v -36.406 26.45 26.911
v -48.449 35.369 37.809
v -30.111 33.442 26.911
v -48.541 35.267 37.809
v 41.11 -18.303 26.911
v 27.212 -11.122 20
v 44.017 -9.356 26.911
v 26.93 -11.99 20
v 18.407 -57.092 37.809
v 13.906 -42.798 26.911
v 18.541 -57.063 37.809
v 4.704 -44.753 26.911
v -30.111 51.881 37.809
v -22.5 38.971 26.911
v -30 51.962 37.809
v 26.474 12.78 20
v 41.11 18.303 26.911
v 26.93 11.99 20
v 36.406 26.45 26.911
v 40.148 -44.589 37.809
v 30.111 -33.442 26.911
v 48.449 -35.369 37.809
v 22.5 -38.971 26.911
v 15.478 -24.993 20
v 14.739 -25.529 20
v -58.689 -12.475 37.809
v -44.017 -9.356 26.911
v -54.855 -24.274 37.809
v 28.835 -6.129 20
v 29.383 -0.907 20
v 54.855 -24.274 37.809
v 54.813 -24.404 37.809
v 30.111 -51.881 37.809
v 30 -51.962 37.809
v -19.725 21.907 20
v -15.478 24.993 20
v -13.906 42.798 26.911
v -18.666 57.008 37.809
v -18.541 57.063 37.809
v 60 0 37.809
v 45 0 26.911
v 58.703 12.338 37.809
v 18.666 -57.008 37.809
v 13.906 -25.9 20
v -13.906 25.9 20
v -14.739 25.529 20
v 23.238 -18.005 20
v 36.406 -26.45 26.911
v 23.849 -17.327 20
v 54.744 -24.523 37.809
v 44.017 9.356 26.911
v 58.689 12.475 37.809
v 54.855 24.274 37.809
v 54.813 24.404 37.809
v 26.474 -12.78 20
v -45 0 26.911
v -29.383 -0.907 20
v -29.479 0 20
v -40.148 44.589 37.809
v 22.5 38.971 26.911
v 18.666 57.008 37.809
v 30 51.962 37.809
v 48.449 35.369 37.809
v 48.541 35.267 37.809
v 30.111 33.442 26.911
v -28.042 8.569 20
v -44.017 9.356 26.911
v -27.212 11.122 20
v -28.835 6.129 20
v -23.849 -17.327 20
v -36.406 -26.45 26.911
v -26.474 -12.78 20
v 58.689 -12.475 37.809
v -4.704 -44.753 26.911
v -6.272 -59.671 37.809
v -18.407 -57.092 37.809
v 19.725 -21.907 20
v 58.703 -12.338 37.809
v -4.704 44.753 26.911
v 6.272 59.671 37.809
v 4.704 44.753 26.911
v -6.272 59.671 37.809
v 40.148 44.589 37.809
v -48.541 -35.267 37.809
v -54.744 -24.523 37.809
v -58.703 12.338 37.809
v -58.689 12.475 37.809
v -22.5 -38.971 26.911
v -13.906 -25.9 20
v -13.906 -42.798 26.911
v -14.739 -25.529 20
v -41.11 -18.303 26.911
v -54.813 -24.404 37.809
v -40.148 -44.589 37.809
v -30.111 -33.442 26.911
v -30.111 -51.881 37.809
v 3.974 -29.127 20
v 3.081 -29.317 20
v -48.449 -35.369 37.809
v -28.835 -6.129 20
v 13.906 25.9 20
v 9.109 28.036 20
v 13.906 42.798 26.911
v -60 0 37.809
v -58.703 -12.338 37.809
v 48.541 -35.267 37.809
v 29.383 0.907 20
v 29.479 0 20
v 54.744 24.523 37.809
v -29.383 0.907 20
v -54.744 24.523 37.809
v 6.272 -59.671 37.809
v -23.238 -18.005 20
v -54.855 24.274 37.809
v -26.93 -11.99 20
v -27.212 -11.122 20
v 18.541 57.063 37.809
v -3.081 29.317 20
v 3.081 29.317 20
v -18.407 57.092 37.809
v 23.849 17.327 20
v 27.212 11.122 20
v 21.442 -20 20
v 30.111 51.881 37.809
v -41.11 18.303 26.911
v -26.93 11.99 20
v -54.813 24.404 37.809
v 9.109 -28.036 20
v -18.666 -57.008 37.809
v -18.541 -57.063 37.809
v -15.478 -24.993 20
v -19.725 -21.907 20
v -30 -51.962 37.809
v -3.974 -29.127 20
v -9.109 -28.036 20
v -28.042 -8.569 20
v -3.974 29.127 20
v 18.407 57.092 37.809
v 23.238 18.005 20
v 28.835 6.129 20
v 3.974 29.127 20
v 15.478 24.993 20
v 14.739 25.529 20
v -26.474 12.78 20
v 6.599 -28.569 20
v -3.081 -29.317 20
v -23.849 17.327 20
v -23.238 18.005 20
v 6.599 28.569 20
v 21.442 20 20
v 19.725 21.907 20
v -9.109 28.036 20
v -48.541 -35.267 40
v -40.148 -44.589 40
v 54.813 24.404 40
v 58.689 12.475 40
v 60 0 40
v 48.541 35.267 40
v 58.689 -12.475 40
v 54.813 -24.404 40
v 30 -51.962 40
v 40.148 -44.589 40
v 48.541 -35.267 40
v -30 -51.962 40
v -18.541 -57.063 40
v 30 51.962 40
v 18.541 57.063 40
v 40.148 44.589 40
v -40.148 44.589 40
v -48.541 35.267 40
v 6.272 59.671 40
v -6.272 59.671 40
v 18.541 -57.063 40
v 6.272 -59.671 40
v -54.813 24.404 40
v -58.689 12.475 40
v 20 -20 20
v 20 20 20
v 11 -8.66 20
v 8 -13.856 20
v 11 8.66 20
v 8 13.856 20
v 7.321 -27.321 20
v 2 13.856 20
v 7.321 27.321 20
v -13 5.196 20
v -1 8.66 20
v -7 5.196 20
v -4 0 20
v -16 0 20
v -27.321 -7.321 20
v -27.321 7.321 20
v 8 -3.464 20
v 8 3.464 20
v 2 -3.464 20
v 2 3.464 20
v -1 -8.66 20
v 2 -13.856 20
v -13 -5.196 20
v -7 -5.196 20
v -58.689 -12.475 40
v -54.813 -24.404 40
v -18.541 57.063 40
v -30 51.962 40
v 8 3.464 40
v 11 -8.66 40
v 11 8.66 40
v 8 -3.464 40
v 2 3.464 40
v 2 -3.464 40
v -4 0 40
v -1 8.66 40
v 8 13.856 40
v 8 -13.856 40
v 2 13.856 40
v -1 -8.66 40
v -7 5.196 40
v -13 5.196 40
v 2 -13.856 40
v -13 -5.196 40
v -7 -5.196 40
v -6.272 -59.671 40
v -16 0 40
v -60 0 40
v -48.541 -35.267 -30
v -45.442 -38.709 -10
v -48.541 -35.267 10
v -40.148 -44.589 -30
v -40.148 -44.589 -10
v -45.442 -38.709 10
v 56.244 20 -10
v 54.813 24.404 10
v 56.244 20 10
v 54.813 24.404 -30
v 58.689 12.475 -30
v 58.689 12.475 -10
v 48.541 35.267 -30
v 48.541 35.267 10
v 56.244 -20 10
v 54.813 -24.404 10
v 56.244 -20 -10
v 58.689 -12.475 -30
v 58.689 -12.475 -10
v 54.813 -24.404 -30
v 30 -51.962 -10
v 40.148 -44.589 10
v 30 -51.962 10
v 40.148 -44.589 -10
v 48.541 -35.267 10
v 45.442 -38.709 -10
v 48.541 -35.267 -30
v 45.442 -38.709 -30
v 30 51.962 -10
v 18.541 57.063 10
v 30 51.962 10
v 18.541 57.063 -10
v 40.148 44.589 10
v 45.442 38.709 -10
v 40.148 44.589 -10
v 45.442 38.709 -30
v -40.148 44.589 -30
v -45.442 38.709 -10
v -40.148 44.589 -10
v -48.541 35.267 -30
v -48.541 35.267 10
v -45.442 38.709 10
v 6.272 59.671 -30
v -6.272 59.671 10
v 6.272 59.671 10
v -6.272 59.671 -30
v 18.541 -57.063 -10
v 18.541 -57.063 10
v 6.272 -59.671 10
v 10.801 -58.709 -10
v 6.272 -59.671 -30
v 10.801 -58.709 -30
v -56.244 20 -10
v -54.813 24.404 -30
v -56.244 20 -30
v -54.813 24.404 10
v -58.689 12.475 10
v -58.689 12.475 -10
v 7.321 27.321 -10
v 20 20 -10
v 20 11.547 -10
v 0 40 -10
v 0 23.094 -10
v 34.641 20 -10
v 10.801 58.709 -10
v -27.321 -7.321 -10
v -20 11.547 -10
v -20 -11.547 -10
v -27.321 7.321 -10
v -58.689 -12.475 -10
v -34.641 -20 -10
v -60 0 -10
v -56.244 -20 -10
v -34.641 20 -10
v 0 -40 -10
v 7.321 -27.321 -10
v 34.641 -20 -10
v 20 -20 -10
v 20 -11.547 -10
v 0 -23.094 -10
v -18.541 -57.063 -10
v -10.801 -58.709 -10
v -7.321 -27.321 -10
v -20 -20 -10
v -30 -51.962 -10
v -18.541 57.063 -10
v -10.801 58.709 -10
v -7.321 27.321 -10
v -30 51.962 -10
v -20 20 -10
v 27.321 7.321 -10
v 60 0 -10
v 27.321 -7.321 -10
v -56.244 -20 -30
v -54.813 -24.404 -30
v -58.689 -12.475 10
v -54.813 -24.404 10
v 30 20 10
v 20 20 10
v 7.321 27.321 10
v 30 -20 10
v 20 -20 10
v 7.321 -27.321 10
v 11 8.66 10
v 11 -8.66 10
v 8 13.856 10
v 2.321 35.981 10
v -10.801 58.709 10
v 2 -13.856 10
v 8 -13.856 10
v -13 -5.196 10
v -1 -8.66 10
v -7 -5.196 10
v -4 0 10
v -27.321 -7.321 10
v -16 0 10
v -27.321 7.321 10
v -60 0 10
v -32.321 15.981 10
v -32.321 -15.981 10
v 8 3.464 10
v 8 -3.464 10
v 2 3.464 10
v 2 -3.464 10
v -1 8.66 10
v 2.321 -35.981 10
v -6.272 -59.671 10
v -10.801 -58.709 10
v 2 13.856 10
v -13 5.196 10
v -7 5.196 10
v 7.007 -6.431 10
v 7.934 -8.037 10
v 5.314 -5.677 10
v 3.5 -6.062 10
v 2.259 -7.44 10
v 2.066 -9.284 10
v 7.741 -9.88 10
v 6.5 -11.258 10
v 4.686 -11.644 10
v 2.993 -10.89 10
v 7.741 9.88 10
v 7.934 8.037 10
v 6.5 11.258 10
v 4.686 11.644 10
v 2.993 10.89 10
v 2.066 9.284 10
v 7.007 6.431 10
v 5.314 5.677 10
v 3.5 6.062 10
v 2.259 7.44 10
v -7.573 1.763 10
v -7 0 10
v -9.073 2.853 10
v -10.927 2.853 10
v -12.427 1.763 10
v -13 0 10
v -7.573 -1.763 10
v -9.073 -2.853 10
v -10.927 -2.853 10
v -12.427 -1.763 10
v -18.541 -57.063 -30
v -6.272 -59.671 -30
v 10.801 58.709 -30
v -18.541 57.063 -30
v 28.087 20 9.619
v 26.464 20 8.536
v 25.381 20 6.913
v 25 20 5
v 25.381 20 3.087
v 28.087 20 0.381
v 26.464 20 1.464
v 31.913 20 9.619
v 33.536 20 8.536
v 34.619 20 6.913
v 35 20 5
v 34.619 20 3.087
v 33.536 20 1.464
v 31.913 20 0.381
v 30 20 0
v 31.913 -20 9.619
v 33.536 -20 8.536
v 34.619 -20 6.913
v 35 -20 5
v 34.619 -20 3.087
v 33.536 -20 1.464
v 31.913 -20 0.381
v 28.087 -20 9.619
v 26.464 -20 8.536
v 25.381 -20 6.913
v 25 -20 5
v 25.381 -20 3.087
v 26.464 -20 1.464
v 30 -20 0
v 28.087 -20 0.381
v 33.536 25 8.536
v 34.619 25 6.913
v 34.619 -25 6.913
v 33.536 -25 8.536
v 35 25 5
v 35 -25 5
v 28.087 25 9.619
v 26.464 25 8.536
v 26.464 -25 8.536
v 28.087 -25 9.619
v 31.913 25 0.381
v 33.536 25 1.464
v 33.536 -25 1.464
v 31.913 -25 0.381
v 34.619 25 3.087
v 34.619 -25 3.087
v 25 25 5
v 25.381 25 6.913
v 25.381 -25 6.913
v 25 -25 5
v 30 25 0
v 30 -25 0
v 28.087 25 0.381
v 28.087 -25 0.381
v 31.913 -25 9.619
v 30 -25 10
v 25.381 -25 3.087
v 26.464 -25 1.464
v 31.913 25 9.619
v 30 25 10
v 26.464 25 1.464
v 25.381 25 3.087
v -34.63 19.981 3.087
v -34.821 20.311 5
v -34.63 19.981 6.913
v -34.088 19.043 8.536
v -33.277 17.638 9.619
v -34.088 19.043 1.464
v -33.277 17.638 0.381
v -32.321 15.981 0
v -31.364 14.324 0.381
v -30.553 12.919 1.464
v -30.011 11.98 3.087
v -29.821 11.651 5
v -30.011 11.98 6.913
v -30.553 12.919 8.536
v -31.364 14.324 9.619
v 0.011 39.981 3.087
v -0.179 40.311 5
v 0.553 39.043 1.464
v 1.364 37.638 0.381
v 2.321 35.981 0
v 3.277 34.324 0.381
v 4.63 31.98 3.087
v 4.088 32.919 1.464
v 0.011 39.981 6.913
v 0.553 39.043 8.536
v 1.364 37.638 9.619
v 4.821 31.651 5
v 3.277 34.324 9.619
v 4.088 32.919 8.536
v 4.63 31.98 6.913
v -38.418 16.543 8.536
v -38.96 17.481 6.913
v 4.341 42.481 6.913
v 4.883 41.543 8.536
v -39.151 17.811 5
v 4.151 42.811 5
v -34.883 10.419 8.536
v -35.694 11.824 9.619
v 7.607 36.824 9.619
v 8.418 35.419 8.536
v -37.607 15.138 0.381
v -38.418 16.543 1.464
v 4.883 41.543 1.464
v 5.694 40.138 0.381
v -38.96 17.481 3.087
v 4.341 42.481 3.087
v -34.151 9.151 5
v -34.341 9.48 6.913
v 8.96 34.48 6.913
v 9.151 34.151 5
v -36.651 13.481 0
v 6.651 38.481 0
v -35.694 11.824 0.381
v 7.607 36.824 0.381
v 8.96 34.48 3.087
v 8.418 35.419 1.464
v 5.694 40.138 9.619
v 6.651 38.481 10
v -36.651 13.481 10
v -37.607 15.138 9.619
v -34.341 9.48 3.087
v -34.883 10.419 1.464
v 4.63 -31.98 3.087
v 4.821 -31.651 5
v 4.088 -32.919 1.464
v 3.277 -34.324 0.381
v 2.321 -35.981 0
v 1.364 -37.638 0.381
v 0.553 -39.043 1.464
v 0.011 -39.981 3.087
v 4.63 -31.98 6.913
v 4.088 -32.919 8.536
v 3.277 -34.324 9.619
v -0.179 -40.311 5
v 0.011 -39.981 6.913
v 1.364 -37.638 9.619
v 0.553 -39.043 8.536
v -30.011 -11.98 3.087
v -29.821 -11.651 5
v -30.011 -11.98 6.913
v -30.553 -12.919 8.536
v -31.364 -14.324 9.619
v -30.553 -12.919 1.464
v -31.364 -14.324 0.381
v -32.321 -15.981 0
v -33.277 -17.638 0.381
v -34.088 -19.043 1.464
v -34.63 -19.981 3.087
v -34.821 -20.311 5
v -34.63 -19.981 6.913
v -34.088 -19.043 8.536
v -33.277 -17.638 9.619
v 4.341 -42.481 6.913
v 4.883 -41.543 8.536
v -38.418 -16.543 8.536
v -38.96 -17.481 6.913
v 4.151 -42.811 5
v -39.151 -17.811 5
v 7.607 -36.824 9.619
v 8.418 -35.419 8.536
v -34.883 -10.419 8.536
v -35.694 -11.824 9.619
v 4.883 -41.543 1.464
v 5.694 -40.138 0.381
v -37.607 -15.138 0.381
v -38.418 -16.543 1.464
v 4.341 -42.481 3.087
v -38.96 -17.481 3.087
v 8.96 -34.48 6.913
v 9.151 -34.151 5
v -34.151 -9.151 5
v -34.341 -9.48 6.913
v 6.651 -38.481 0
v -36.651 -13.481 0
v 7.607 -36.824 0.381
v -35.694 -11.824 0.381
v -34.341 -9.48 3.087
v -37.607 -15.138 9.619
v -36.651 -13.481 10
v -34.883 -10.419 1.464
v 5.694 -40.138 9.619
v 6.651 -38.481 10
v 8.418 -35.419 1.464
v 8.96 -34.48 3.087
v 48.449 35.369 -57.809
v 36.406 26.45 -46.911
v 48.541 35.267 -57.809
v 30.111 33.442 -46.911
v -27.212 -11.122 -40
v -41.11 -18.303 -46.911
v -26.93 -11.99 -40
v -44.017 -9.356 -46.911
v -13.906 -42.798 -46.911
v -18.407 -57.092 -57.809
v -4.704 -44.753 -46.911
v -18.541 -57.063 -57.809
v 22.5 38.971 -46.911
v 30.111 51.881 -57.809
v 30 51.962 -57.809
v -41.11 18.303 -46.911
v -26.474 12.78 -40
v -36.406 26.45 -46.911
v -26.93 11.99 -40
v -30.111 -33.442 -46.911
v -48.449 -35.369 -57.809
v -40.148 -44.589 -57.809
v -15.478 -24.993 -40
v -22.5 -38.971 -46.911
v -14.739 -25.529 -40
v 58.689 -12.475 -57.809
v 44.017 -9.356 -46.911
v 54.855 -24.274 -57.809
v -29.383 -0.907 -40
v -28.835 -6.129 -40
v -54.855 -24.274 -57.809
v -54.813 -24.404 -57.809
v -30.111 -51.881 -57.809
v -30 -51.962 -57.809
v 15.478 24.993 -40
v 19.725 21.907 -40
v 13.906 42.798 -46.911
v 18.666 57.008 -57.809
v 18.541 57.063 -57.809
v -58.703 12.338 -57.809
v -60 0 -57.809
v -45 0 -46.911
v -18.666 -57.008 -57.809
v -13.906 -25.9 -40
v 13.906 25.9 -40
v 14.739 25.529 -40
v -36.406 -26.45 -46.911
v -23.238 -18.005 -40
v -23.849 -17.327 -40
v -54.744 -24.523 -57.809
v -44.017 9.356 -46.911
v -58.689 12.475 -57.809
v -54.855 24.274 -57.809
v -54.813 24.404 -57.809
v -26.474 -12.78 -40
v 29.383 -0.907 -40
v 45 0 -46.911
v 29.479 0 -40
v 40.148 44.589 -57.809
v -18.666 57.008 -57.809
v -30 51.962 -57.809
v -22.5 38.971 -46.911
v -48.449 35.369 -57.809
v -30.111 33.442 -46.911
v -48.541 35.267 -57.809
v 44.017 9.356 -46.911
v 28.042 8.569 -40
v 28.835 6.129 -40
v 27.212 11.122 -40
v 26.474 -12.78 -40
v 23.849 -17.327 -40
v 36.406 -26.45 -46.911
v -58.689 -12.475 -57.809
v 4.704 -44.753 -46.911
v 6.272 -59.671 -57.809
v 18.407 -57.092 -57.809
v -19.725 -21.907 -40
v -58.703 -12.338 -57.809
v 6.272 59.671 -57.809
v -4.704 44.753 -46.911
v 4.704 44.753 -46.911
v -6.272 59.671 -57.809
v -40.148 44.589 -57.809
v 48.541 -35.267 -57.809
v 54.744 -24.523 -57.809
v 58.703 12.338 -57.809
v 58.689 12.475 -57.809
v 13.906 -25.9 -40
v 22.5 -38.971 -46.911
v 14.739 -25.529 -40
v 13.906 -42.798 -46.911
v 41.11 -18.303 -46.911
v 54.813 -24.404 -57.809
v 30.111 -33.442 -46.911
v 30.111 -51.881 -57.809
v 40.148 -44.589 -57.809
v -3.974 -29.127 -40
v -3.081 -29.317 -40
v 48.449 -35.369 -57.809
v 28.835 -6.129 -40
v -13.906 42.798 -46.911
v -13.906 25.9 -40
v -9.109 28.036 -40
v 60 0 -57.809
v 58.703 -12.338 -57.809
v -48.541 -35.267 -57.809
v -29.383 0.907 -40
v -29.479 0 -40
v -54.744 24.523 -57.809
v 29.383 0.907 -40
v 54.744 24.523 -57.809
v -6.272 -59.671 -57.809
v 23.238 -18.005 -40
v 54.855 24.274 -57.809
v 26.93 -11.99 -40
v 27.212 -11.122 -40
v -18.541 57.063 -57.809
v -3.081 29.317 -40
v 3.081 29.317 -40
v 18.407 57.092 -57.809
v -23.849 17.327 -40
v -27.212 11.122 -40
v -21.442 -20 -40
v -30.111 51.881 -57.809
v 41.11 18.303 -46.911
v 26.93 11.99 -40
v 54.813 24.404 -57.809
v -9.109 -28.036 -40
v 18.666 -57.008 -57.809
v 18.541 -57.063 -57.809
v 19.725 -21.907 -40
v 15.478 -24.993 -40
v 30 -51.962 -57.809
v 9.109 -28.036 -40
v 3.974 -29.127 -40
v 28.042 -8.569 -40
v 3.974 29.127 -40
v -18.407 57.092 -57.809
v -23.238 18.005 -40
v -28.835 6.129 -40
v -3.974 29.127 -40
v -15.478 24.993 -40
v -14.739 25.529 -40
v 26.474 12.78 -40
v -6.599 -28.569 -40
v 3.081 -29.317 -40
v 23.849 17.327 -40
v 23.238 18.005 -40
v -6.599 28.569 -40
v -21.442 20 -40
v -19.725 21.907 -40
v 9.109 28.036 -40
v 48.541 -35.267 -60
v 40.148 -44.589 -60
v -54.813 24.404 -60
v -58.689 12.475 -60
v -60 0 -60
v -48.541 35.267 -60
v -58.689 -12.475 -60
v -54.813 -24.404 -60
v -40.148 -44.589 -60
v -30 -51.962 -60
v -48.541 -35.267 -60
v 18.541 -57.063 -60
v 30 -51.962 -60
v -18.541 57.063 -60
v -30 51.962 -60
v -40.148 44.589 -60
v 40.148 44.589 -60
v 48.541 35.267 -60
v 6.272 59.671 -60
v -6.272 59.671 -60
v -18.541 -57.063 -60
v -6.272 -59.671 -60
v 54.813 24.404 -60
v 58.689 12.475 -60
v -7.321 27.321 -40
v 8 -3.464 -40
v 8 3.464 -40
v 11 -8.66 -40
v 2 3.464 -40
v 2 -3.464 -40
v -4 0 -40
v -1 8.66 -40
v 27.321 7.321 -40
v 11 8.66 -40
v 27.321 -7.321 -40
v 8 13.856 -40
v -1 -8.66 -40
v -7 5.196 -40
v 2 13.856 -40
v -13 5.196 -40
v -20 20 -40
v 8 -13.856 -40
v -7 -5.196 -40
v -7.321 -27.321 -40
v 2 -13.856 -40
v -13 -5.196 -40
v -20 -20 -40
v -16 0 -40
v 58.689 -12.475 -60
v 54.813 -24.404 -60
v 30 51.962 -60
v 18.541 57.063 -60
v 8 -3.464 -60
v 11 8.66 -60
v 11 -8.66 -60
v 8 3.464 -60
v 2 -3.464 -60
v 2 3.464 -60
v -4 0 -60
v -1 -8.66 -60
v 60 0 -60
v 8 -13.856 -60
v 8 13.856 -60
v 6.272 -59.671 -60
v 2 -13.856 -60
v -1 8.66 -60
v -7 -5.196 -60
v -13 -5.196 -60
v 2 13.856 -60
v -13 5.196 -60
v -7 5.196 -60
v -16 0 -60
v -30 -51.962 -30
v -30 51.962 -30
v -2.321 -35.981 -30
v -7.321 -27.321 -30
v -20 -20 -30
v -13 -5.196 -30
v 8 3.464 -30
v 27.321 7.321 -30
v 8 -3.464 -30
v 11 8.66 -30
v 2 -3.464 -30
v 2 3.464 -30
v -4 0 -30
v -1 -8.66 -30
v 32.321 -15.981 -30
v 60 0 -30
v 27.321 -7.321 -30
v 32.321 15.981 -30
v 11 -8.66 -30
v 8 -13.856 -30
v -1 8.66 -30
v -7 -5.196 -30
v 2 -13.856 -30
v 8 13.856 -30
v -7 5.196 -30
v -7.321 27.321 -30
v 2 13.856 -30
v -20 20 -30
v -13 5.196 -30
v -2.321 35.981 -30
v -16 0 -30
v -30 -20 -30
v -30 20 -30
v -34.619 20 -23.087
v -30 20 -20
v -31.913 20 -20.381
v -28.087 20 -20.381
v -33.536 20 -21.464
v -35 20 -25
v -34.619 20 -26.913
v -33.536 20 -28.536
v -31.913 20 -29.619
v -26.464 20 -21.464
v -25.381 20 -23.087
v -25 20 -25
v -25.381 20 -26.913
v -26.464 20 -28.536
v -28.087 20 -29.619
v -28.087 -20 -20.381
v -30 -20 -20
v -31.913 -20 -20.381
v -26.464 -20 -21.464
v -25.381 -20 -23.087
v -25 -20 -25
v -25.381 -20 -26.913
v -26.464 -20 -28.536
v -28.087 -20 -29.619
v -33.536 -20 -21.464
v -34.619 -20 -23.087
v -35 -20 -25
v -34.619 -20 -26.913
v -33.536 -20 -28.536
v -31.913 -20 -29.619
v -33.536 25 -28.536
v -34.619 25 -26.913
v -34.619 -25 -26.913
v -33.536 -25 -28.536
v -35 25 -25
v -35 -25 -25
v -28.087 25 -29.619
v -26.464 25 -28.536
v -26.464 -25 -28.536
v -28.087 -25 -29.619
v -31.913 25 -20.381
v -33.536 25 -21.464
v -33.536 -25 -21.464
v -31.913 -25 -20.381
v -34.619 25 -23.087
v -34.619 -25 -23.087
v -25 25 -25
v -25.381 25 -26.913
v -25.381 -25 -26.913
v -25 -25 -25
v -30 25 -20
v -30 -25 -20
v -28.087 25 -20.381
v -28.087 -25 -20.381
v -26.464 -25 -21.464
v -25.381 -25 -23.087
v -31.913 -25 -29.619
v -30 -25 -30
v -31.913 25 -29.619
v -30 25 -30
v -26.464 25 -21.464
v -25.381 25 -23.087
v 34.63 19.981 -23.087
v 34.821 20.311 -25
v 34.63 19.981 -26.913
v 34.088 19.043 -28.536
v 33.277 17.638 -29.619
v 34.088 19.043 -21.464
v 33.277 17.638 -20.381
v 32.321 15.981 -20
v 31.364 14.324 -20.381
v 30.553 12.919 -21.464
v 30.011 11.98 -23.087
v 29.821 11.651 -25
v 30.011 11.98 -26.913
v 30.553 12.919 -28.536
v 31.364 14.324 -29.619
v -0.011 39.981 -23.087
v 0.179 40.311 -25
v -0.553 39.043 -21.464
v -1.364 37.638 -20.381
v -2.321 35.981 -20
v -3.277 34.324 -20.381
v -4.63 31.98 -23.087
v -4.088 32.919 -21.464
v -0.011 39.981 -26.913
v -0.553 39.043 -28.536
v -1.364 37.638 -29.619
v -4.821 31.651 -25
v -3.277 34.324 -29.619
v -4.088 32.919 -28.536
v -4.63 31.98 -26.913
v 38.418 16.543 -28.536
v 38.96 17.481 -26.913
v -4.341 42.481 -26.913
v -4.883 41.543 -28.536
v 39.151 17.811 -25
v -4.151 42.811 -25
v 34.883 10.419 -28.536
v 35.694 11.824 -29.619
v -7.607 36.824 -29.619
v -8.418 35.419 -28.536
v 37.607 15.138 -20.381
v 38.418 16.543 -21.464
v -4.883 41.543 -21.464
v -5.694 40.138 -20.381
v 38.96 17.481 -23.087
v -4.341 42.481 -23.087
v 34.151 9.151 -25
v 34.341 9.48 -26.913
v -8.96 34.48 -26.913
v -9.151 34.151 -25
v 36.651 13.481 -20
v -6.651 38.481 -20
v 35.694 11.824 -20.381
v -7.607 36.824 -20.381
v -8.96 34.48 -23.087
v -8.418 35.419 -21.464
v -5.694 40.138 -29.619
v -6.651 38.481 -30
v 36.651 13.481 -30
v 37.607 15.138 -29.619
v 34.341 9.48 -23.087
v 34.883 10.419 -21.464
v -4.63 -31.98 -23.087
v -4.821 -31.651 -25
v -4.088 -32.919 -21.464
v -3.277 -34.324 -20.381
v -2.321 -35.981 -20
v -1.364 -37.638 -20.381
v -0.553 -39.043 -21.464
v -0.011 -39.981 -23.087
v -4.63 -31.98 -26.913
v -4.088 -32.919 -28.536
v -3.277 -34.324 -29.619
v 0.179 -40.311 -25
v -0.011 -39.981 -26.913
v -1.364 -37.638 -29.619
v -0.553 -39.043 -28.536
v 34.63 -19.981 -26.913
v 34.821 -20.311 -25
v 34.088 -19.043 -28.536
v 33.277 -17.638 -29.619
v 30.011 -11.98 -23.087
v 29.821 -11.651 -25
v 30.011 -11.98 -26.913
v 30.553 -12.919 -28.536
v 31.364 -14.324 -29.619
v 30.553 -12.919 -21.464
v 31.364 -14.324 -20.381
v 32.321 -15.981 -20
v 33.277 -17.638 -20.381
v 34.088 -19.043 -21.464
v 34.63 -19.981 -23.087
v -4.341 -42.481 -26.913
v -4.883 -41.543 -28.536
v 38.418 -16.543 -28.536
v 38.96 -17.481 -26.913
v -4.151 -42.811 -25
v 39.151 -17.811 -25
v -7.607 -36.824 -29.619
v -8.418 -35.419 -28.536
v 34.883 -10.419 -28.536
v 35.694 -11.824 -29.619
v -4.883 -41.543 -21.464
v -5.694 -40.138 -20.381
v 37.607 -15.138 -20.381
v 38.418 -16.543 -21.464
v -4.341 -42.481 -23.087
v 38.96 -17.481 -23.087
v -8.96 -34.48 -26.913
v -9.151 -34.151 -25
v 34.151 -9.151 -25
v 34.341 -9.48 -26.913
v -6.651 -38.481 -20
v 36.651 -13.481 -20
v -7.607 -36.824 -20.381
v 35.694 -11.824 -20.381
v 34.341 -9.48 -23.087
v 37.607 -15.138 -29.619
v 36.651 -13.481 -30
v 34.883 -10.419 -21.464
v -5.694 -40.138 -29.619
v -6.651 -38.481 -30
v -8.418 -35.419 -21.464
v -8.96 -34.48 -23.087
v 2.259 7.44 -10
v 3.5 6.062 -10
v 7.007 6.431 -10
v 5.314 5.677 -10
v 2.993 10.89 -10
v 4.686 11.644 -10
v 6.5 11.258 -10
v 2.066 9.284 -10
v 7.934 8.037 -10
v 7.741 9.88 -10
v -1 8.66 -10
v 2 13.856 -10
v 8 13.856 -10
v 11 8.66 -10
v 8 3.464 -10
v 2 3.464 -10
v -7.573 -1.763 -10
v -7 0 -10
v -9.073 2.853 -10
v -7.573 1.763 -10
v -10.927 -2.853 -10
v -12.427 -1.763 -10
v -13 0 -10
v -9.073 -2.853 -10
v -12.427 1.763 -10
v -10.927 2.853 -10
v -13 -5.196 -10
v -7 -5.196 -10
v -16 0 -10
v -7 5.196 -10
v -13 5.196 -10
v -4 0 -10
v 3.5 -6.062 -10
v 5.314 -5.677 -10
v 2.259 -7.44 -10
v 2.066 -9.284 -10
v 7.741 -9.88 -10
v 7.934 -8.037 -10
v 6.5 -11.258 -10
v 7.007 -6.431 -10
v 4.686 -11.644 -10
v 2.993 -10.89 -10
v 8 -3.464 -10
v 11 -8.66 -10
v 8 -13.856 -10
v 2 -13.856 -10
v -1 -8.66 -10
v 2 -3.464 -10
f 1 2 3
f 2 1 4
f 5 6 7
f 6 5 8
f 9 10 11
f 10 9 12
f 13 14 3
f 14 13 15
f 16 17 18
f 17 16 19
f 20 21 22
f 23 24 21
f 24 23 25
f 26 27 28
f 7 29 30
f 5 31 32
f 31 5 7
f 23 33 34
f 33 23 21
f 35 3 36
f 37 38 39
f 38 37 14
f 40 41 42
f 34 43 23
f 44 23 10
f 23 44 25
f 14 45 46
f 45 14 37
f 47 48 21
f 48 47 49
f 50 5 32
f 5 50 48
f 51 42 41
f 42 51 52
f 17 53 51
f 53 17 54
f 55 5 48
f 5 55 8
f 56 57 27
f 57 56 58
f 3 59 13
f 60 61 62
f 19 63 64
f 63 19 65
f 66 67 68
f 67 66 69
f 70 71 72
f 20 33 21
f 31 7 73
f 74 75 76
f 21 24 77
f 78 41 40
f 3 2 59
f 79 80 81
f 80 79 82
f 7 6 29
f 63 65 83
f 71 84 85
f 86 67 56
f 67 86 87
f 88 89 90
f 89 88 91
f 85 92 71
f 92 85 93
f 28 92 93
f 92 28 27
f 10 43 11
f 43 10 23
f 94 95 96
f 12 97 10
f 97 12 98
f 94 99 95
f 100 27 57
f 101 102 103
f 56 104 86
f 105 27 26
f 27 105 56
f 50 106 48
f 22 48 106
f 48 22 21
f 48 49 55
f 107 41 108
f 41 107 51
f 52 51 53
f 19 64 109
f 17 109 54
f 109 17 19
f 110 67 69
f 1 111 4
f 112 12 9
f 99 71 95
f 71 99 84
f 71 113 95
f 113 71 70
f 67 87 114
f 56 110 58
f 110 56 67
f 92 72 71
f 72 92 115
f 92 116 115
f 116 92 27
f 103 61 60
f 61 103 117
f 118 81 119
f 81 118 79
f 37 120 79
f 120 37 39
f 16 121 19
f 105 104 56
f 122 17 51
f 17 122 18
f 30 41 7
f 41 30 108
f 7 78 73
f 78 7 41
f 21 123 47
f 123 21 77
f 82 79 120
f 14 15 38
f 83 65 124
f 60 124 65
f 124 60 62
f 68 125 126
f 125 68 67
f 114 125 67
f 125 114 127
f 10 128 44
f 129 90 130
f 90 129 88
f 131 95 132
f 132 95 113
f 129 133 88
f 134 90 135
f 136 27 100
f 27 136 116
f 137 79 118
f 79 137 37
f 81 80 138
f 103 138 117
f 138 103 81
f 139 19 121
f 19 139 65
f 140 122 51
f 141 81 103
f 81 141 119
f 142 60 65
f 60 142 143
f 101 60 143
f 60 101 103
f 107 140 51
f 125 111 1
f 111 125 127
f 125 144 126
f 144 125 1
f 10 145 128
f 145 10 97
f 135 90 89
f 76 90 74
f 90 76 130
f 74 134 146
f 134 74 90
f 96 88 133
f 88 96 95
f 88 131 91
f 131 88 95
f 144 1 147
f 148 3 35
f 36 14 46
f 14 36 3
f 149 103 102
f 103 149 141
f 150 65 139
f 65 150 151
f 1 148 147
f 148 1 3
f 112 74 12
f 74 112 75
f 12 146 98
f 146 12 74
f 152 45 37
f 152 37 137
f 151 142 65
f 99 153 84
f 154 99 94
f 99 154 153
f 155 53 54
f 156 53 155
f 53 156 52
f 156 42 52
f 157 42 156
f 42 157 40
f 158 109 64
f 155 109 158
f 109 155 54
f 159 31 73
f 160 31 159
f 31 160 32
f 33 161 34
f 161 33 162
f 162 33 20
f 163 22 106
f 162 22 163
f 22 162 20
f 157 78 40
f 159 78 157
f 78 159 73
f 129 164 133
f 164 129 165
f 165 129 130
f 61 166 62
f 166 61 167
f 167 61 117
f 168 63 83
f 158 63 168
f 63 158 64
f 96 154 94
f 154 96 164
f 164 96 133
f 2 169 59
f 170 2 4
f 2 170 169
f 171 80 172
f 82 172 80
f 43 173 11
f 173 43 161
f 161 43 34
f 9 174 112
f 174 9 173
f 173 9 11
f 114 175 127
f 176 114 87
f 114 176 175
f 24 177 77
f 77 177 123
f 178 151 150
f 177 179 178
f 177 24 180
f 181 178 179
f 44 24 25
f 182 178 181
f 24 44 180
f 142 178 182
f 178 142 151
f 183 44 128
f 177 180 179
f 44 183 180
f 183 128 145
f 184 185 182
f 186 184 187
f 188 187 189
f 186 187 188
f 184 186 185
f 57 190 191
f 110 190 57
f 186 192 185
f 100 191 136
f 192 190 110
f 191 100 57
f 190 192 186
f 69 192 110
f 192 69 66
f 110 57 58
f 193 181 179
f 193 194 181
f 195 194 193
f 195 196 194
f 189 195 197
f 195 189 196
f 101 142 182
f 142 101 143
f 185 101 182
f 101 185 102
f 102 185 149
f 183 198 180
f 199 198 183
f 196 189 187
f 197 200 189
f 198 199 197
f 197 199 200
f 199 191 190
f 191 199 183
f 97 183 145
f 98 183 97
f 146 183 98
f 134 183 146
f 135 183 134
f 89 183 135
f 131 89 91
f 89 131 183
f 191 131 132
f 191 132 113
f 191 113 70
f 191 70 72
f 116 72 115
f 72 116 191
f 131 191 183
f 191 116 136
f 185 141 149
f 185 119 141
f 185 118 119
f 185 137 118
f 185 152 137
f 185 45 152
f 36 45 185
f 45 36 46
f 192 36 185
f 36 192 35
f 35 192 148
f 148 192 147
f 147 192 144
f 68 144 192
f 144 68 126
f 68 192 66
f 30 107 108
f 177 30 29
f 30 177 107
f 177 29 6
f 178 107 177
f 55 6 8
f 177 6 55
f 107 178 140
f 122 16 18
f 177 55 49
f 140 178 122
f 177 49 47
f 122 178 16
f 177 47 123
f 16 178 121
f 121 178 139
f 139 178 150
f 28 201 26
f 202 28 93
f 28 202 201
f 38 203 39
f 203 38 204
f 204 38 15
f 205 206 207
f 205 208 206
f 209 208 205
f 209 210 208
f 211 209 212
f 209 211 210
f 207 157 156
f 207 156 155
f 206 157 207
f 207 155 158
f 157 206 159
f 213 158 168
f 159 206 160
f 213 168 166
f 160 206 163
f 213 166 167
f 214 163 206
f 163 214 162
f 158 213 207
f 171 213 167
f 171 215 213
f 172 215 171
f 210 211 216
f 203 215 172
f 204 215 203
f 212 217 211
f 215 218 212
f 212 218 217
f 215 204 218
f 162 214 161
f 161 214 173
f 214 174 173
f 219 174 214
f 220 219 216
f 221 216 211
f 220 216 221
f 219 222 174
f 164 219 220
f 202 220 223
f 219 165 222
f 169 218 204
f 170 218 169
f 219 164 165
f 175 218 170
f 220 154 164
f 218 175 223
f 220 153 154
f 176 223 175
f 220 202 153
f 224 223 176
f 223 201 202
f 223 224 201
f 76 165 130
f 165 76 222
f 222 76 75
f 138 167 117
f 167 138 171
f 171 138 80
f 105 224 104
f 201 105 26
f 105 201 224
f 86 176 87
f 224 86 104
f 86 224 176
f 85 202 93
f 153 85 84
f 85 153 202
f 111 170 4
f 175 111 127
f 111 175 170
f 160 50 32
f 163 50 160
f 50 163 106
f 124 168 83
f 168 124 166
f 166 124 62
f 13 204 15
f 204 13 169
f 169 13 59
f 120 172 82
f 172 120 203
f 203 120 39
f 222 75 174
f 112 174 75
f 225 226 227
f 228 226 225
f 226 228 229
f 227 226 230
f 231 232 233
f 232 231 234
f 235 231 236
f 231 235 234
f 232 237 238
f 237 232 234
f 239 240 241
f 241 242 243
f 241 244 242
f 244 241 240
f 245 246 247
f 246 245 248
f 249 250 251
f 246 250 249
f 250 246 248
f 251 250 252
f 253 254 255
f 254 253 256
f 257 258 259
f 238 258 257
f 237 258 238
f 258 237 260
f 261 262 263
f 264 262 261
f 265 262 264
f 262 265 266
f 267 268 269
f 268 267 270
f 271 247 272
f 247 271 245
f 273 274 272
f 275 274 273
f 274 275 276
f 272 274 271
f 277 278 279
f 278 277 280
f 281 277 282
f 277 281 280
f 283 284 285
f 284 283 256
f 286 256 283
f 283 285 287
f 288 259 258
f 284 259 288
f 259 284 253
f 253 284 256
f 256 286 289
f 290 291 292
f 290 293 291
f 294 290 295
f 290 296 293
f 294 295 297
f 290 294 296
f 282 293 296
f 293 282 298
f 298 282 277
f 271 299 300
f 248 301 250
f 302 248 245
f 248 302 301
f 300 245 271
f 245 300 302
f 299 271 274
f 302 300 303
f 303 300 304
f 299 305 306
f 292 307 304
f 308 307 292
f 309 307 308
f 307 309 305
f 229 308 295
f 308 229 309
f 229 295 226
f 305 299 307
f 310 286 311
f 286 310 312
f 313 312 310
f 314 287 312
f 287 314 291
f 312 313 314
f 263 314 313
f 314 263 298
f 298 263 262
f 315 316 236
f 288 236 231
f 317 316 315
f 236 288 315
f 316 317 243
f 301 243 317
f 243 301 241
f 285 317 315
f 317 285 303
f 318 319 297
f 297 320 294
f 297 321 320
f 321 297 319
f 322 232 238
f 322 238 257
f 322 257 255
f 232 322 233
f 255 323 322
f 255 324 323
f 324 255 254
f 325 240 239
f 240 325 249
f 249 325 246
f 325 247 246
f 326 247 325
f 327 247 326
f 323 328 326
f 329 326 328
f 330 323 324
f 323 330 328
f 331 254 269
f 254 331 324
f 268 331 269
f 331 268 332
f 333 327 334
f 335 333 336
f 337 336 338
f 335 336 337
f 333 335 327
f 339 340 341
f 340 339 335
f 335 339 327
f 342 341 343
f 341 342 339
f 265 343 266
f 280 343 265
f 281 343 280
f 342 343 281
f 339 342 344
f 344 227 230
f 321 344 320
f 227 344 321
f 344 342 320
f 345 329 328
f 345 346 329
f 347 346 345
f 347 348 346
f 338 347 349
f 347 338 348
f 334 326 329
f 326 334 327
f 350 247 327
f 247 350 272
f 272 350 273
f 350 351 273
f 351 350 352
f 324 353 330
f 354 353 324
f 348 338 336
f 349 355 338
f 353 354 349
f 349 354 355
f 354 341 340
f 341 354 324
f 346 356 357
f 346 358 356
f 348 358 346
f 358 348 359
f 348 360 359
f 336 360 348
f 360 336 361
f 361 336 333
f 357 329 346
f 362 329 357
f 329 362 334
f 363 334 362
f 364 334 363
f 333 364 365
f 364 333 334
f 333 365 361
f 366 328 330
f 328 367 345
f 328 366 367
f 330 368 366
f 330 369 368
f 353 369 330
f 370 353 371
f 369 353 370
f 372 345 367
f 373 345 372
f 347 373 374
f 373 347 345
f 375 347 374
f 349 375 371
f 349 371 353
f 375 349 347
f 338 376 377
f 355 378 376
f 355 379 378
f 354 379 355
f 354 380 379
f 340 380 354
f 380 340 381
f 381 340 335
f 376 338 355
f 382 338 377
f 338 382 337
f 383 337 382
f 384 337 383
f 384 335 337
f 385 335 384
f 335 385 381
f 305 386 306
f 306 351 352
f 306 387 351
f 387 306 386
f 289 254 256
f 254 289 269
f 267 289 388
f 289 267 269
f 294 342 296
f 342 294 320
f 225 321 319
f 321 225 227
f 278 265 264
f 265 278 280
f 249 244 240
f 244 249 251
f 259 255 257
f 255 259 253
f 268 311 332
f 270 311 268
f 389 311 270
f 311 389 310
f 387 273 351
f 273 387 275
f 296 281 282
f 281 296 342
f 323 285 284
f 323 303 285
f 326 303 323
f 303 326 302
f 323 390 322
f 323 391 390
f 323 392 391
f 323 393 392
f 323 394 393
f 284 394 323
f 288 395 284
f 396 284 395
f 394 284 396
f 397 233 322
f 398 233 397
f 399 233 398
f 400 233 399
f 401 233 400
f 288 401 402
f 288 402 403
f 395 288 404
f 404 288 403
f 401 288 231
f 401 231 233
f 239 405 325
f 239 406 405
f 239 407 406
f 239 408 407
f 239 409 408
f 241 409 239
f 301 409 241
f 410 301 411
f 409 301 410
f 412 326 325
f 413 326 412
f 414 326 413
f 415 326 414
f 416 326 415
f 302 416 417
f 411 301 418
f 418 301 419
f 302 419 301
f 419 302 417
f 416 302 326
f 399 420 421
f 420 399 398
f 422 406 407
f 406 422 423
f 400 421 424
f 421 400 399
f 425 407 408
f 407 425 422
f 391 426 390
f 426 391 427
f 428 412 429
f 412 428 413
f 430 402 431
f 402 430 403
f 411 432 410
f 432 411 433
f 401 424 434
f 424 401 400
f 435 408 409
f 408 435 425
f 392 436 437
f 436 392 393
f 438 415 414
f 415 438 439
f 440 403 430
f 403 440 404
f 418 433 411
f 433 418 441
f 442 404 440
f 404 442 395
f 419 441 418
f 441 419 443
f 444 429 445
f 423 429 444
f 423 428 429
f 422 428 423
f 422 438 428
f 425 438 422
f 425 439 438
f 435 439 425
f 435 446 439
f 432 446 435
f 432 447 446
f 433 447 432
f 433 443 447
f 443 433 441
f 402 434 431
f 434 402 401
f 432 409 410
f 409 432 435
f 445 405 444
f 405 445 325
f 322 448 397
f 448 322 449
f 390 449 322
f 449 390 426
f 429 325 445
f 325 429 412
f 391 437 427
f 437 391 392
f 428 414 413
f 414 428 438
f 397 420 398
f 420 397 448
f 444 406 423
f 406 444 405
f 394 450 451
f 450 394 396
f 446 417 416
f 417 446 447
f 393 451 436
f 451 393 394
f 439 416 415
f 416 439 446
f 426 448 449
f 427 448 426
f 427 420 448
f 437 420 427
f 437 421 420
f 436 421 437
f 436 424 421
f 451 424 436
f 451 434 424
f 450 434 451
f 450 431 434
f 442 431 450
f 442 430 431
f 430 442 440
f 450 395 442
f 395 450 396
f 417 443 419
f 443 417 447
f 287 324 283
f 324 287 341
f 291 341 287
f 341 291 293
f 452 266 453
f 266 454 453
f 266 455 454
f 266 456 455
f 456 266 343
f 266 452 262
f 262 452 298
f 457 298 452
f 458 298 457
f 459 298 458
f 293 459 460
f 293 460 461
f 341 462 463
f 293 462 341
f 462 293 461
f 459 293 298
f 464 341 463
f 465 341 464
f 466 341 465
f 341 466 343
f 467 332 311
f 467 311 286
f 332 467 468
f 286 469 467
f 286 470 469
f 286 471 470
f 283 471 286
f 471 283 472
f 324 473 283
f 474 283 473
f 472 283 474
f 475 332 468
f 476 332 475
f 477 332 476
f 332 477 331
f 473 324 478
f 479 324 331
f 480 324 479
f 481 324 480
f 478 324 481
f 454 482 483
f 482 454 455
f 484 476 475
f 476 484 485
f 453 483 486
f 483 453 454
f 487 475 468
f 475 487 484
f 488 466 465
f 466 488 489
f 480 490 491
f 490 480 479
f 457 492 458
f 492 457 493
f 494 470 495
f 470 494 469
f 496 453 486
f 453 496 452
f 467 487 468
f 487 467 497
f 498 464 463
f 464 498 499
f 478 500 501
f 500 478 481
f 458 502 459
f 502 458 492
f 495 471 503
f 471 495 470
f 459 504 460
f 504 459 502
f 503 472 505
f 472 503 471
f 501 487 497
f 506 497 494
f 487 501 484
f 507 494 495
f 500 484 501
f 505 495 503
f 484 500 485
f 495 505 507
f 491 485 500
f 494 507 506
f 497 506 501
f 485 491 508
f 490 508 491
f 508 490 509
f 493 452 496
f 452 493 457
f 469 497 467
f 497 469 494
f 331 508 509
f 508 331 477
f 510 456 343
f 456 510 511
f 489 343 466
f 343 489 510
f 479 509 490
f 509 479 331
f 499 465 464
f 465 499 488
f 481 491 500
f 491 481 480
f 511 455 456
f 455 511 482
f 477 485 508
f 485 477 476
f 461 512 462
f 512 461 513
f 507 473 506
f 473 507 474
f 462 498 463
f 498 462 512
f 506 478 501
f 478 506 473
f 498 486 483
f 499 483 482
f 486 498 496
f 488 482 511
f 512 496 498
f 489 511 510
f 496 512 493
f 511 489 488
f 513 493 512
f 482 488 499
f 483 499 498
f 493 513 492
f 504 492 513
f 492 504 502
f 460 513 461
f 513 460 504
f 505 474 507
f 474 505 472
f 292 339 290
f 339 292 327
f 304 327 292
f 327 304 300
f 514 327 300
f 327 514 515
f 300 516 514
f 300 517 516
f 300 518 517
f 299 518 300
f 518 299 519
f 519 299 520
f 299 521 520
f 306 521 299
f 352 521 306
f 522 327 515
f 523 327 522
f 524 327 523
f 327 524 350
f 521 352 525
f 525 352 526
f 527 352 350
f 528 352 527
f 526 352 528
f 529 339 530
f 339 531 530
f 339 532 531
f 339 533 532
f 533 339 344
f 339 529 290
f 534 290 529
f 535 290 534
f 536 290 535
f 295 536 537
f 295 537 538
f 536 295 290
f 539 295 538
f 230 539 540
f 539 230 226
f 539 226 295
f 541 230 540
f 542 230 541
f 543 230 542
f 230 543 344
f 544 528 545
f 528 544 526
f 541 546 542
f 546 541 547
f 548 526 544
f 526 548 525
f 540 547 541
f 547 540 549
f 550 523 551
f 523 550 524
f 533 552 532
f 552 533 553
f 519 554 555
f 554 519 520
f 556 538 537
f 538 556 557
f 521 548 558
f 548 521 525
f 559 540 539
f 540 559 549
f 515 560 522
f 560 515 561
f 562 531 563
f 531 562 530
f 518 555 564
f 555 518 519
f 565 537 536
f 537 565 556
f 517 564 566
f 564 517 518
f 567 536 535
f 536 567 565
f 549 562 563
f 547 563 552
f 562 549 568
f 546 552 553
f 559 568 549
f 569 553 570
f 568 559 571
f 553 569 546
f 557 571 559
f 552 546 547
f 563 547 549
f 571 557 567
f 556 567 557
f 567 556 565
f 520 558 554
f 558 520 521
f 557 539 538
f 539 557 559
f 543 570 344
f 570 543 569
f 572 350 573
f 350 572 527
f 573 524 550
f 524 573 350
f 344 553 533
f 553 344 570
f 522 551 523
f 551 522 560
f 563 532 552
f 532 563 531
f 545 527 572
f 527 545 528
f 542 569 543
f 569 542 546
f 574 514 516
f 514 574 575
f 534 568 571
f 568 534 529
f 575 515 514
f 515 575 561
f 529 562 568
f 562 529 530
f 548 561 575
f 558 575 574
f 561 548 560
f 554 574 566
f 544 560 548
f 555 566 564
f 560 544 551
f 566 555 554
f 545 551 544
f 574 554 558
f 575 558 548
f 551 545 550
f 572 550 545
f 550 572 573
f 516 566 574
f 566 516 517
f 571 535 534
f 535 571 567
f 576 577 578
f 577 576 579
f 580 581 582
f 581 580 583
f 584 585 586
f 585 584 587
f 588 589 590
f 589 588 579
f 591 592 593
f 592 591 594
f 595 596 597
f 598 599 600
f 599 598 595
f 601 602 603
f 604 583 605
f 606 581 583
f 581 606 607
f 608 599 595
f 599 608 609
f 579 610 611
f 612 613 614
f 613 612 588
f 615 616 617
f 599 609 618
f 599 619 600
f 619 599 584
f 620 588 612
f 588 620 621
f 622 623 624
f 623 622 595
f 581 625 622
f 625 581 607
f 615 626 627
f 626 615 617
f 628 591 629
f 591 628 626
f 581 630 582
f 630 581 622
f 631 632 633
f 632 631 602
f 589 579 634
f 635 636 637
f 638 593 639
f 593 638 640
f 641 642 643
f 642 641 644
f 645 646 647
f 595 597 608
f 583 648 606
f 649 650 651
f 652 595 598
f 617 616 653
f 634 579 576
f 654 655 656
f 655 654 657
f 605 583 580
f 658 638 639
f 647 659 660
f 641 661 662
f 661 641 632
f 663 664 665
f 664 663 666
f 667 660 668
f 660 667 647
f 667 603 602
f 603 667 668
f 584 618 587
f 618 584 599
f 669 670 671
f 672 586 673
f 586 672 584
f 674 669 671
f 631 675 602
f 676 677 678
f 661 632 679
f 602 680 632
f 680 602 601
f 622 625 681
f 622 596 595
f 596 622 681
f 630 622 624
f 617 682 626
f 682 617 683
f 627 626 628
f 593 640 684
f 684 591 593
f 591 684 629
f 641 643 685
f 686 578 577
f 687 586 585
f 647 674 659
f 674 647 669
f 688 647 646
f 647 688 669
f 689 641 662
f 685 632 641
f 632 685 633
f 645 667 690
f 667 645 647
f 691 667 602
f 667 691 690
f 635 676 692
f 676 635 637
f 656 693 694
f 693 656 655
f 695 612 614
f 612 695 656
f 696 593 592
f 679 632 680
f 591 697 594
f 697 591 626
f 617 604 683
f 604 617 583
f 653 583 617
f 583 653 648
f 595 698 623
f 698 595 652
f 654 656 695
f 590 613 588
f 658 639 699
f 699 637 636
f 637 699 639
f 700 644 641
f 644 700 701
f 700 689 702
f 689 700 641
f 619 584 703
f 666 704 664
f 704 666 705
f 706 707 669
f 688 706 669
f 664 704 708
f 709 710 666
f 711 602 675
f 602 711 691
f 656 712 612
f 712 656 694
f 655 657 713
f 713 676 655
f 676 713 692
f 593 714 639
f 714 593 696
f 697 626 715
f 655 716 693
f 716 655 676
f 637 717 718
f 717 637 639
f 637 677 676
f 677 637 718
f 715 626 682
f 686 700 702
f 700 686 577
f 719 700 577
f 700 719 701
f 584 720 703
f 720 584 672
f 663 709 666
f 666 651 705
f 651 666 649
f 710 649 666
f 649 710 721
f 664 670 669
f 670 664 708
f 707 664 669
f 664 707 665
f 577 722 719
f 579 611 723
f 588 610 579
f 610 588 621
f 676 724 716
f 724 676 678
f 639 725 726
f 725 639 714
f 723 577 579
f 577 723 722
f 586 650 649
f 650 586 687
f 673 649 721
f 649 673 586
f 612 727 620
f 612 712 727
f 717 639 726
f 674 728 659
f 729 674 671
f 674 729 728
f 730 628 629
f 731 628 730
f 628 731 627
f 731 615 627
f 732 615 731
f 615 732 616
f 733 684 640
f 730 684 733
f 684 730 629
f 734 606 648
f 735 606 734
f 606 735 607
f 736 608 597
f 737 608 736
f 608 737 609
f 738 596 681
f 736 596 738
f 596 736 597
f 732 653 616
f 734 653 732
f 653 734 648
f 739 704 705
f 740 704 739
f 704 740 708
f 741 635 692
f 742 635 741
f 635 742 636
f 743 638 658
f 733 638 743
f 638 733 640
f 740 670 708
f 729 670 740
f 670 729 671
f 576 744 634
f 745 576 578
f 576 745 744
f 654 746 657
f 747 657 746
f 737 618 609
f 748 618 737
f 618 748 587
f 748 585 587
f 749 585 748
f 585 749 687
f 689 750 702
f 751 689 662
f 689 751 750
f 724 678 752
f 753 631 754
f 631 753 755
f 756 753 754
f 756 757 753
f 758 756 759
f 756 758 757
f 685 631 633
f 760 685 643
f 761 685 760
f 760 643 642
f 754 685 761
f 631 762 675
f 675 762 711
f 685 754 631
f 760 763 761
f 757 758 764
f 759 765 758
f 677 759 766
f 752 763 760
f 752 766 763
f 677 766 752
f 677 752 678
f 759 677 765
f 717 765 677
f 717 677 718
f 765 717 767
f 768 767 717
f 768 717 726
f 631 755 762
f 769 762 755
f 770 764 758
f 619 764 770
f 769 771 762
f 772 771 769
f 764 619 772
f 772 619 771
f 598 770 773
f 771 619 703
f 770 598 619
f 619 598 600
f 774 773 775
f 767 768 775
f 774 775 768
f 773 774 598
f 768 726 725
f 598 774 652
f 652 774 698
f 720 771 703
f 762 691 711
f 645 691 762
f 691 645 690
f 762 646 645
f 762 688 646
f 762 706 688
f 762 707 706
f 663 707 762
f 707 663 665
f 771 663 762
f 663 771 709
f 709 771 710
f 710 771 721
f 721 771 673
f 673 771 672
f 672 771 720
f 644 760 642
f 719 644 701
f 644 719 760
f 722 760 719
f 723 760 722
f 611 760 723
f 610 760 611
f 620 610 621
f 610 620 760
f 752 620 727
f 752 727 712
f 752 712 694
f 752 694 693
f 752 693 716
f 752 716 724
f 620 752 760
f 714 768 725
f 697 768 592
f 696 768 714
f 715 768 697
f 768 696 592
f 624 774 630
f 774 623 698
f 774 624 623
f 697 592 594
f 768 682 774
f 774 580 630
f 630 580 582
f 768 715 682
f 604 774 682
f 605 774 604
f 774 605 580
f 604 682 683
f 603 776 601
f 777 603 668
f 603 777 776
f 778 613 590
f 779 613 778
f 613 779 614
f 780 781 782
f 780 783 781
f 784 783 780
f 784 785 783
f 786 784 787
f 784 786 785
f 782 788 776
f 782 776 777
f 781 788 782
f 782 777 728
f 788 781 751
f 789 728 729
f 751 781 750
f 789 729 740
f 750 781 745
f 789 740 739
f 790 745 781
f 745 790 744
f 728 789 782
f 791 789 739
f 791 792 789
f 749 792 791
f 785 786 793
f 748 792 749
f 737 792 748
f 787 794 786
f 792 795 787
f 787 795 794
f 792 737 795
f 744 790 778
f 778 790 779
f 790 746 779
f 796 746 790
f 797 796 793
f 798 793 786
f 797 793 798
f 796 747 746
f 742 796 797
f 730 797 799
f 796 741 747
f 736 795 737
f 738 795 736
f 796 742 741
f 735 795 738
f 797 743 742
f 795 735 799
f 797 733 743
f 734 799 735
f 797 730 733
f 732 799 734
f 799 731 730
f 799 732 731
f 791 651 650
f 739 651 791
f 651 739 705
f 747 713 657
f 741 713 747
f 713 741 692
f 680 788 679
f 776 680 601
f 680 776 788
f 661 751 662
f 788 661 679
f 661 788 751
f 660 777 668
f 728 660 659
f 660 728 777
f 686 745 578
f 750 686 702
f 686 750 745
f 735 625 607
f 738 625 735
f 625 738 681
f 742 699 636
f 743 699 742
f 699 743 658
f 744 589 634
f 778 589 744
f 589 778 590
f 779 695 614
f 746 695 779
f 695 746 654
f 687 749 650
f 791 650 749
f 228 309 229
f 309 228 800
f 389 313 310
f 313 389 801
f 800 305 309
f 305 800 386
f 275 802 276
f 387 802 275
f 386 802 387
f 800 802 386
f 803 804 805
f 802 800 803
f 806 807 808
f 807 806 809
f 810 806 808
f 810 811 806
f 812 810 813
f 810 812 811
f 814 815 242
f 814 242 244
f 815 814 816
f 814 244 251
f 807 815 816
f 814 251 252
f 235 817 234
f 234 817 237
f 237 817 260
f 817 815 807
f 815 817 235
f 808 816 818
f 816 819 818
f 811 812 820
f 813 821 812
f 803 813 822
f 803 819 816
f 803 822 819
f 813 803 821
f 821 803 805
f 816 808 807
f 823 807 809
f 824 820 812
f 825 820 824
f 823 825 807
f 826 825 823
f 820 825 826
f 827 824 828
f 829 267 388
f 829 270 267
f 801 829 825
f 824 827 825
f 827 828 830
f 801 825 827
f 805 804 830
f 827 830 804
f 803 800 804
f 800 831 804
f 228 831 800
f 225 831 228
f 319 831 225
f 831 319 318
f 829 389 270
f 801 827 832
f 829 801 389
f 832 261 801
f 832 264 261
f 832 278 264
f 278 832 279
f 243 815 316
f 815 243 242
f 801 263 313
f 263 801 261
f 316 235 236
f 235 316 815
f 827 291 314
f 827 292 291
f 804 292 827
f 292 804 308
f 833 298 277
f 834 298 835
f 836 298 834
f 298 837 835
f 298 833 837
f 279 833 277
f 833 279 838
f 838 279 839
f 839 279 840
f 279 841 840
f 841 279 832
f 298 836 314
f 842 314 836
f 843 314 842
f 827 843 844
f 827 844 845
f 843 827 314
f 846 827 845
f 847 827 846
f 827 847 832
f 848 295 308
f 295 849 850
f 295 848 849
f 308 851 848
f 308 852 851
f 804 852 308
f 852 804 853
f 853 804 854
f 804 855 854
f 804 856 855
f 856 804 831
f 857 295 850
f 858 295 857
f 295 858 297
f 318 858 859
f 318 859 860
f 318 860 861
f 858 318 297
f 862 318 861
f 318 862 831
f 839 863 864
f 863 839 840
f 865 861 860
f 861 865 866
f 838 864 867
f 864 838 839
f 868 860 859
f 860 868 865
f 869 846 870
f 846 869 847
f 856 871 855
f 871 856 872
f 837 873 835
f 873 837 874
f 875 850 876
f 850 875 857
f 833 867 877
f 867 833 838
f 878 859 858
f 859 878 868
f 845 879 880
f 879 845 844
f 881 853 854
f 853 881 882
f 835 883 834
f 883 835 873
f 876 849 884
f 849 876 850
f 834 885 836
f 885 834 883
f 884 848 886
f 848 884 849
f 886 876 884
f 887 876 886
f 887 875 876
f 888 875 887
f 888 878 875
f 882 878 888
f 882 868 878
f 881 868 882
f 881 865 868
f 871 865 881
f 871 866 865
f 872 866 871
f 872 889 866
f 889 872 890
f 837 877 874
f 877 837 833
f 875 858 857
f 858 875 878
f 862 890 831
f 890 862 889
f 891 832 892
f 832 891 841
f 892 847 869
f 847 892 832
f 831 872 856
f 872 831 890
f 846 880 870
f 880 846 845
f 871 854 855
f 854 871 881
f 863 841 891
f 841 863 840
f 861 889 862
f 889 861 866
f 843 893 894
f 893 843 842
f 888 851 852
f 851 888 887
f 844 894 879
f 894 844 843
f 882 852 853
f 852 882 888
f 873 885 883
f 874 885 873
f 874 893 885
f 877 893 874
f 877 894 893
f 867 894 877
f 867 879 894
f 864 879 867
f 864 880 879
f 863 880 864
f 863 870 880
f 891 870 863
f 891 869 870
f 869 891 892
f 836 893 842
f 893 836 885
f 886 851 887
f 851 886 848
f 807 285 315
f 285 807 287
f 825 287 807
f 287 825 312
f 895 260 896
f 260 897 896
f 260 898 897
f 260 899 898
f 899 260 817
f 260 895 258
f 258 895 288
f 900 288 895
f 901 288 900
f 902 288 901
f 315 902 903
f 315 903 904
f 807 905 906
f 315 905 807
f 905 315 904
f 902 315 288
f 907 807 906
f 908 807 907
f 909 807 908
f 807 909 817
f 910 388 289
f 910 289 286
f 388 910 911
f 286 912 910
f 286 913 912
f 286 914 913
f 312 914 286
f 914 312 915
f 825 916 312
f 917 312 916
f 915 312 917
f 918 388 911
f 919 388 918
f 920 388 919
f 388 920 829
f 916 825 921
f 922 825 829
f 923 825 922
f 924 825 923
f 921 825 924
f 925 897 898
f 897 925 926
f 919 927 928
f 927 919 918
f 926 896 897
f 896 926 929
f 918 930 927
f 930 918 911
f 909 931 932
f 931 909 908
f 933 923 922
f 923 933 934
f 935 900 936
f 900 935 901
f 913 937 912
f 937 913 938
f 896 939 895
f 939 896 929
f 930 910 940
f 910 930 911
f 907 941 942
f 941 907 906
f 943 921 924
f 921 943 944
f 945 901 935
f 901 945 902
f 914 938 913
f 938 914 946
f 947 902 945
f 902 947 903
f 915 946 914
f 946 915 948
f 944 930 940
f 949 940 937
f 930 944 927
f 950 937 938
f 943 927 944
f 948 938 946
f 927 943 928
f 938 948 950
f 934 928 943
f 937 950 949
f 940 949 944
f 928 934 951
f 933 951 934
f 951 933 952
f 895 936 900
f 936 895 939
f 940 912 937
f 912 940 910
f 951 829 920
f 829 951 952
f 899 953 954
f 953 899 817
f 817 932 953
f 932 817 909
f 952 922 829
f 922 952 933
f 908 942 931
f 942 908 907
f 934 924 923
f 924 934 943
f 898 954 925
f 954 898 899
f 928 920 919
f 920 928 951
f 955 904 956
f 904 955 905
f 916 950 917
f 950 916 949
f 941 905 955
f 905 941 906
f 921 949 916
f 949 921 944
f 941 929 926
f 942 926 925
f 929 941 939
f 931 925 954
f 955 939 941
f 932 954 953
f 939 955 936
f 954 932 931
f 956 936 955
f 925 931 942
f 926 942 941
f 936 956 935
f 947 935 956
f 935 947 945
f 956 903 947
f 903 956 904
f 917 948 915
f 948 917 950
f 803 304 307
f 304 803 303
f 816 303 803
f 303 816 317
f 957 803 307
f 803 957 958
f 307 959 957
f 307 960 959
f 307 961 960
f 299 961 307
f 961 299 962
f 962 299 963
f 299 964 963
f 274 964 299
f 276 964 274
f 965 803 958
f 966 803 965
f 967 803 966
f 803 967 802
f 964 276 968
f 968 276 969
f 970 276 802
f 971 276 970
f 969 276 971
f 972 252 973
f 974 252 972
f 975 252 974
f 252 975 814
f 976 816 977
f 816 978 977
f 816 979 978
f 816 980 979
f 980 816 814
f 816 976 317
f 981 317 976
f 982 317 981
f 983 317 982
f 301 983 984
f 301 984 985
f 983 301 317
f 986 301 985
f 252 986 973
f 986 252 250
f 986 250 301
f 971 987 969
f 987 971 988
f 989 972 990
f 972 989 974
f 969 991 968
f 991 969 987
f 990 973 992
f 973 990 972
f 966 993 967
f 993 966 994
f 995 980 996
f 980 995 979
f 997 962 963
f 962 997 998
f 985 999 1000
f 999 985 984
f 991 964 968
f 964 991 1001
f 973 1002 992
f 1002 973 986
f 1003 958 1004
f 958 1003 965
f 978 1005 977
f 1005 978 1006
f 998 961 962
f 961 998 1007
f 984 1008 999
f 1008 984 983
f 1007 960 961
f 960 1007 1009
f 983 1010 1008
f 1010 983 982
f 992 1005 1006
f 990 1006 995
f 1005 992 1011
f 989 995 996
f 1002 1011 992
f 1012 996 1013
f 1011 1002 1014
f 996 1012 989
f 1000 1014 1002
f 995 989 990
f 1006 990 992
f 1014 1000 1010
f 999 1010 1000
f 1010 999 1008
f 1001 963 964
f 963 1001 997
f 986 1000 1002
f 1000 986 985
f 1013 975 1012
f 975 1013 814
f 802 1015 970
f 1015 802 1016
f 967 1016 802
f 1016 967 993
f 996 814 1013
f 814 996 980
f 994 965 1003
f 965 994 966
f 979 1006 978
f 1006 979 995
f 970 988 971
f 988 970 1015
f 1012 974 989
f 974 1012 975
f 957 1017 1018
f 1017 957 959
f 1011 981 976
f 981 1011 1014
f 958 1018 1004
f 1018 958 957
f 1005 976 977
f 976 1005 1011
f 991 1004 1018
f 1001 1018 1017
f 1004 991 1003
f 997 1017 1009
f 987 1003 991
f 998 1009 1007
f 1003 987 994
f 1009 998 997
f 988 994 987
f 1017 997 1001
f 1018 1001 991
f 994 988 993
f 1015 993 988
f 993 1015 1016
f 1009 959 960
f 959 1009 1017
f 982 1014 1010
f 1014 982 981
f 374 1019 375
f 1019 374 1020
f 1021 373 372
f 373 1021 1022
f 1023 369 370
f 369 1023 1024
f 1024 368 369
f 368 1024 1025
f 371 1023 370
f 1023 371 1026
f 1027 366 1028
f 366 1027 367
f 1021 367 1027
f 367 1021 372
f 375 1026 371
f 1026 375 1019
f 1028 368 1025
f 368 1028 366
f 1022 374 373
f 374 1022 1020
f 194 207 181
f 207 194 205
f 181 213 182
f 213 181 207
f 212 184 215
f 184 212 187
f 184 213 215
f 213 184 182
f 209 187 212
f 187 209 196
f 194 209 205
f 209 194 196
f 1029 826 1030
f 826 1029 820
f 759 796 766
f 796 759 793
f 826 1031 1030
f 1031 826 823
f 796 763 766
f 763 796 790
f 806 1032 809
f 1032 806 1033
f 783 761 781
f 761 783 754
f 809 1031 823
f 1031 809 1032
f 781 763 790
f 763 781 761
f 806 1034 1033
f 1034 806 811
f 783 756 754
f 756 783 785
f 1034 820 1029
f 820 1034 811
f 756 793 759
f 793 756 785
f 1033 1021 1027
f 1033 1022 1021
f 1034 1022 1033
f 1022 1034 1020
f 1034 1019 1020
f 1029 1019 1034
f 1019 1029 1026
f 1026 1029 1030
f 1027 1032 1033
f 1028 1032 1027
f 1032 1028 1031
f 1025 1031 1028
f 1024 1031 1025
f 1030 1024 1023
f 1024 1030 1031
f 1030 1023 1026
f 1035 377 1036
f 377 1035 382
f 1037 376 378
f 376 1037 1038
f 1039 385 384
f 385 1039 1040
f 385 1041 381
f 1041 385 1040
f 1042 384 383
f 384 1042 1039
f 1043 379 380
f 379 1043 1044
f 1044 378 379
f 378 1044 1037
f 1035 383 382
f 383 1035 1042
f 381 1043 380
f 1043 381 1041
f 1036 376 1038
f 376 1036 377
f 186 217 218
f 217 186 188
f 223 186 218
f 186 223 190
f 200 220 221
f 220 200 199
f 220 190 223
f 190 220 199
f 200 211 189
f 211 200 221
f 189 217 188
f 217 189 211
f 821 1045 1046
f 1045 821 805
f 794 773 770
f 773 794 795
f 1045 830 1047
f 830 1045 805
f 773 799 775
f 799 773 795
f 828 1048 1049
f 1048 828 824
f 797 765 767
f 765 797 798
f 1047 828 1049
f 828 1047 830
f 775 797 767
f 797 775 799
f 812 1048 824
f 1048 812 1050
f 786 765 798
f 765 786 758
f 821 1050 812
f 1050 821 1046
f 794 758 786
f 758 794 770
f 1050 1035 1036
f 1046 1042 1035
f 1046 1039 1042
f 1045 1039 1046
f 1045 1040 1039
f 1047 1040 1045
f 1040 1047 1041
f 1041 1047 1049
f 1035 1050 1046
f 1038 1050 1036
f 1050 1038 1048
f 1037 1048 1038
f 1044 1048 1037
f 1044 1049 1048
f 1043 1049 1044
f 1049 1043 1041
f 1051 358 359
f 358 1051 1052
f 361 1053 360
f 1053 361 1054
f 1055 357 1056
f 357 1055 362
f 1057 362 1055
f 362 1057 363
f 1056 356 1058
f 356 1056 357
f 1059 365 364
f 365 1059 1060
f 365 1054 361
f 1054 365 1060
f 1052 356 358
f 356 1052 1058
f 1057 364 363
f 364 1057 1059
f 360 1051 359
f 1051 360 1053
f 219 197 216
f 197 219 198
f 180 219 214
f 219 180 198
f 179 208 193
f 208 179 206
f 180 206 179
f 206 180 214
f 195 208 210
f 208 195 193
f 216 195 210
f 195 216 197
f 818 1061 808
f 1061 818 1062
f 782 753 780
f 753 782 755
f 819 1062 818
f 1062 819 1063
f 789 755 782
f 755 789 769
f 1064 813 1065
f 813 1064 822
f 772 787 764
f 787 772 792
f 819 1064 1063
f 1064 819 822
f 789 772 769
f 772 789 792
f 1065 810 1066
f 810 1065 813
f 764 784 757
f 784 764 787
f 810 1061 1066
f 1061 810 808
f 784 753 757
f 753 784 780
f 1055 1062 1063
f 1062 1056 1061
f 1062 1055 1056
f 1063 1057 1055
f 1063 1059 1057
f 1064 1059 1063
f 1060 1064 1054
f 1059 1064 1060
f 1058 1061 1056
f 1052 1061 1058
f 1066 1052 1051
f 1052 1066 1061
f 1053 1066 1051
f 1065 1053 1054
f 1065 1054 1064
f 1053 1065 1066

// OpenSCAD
cubeh = 40;
cubew = 40;
axle_size= 5;
screw_d = 3; // m3
wheel_height=20;
wheel_radius=60;
dome_radius=wheel_radius*1.5;

module slot() {
    translate([40, 0, 0]) union() {
      cube([cubeh, cubew, wheel_height*2], center=true);
      translate([-10, cubew/2 + 5, 5]) rotate([90, 0, 0]) cylinder(cubew + 10, r=axle_size, centre=true);
    }
};


dome_angle=acos(wheel_radius/(2 * dome_radius));
function sphere_dist()=sin(dome_angle) * dome_radius;

module wheel_dome() {
    translate([0, 0, wheel_height]) intersection() {
      translate([0, 0, sphere_dist()]) sphere(dome_radius);
      cylinder(h=wheel_height, r=wheel_radius);
    };
};

*wheel_dome();
module uncut_wheel() {
  union() {
    cylinder(h=wheel_height, r=wheel_radius, center=true);
    wheel_dome();
  }
}

module wheel_half() {
    difference() {
        uncut_wheel();
        // slots
        for (i=[0, 120, 240]) {
          rotate([0, 0, i]) slot();
        }
    };
};

module hex_nut(r=6) {
  cylinder(h=100, r=r, $fa=60);
};

difference() {
    union() {
        wheel_half();
        translate([0, 0, -wheel_height]) rotate([0, 180, 0]) wheel_half();
    }
    // screw holes
    for (i=[60, 180, 300]) {
      rotate([0, 0, i])
      union() {
          translate([10, 0, -wheel_height/2]) cylinder(r=screw_d, h=wheel_height*4, center=true);
          translate([10, 0, +wheel_height/2]) hex_nut(6);
          rotate([180, 0, 0]) translate([10, 0, +wheel_height/2]) hex_nut(6);
      }
   }
}
